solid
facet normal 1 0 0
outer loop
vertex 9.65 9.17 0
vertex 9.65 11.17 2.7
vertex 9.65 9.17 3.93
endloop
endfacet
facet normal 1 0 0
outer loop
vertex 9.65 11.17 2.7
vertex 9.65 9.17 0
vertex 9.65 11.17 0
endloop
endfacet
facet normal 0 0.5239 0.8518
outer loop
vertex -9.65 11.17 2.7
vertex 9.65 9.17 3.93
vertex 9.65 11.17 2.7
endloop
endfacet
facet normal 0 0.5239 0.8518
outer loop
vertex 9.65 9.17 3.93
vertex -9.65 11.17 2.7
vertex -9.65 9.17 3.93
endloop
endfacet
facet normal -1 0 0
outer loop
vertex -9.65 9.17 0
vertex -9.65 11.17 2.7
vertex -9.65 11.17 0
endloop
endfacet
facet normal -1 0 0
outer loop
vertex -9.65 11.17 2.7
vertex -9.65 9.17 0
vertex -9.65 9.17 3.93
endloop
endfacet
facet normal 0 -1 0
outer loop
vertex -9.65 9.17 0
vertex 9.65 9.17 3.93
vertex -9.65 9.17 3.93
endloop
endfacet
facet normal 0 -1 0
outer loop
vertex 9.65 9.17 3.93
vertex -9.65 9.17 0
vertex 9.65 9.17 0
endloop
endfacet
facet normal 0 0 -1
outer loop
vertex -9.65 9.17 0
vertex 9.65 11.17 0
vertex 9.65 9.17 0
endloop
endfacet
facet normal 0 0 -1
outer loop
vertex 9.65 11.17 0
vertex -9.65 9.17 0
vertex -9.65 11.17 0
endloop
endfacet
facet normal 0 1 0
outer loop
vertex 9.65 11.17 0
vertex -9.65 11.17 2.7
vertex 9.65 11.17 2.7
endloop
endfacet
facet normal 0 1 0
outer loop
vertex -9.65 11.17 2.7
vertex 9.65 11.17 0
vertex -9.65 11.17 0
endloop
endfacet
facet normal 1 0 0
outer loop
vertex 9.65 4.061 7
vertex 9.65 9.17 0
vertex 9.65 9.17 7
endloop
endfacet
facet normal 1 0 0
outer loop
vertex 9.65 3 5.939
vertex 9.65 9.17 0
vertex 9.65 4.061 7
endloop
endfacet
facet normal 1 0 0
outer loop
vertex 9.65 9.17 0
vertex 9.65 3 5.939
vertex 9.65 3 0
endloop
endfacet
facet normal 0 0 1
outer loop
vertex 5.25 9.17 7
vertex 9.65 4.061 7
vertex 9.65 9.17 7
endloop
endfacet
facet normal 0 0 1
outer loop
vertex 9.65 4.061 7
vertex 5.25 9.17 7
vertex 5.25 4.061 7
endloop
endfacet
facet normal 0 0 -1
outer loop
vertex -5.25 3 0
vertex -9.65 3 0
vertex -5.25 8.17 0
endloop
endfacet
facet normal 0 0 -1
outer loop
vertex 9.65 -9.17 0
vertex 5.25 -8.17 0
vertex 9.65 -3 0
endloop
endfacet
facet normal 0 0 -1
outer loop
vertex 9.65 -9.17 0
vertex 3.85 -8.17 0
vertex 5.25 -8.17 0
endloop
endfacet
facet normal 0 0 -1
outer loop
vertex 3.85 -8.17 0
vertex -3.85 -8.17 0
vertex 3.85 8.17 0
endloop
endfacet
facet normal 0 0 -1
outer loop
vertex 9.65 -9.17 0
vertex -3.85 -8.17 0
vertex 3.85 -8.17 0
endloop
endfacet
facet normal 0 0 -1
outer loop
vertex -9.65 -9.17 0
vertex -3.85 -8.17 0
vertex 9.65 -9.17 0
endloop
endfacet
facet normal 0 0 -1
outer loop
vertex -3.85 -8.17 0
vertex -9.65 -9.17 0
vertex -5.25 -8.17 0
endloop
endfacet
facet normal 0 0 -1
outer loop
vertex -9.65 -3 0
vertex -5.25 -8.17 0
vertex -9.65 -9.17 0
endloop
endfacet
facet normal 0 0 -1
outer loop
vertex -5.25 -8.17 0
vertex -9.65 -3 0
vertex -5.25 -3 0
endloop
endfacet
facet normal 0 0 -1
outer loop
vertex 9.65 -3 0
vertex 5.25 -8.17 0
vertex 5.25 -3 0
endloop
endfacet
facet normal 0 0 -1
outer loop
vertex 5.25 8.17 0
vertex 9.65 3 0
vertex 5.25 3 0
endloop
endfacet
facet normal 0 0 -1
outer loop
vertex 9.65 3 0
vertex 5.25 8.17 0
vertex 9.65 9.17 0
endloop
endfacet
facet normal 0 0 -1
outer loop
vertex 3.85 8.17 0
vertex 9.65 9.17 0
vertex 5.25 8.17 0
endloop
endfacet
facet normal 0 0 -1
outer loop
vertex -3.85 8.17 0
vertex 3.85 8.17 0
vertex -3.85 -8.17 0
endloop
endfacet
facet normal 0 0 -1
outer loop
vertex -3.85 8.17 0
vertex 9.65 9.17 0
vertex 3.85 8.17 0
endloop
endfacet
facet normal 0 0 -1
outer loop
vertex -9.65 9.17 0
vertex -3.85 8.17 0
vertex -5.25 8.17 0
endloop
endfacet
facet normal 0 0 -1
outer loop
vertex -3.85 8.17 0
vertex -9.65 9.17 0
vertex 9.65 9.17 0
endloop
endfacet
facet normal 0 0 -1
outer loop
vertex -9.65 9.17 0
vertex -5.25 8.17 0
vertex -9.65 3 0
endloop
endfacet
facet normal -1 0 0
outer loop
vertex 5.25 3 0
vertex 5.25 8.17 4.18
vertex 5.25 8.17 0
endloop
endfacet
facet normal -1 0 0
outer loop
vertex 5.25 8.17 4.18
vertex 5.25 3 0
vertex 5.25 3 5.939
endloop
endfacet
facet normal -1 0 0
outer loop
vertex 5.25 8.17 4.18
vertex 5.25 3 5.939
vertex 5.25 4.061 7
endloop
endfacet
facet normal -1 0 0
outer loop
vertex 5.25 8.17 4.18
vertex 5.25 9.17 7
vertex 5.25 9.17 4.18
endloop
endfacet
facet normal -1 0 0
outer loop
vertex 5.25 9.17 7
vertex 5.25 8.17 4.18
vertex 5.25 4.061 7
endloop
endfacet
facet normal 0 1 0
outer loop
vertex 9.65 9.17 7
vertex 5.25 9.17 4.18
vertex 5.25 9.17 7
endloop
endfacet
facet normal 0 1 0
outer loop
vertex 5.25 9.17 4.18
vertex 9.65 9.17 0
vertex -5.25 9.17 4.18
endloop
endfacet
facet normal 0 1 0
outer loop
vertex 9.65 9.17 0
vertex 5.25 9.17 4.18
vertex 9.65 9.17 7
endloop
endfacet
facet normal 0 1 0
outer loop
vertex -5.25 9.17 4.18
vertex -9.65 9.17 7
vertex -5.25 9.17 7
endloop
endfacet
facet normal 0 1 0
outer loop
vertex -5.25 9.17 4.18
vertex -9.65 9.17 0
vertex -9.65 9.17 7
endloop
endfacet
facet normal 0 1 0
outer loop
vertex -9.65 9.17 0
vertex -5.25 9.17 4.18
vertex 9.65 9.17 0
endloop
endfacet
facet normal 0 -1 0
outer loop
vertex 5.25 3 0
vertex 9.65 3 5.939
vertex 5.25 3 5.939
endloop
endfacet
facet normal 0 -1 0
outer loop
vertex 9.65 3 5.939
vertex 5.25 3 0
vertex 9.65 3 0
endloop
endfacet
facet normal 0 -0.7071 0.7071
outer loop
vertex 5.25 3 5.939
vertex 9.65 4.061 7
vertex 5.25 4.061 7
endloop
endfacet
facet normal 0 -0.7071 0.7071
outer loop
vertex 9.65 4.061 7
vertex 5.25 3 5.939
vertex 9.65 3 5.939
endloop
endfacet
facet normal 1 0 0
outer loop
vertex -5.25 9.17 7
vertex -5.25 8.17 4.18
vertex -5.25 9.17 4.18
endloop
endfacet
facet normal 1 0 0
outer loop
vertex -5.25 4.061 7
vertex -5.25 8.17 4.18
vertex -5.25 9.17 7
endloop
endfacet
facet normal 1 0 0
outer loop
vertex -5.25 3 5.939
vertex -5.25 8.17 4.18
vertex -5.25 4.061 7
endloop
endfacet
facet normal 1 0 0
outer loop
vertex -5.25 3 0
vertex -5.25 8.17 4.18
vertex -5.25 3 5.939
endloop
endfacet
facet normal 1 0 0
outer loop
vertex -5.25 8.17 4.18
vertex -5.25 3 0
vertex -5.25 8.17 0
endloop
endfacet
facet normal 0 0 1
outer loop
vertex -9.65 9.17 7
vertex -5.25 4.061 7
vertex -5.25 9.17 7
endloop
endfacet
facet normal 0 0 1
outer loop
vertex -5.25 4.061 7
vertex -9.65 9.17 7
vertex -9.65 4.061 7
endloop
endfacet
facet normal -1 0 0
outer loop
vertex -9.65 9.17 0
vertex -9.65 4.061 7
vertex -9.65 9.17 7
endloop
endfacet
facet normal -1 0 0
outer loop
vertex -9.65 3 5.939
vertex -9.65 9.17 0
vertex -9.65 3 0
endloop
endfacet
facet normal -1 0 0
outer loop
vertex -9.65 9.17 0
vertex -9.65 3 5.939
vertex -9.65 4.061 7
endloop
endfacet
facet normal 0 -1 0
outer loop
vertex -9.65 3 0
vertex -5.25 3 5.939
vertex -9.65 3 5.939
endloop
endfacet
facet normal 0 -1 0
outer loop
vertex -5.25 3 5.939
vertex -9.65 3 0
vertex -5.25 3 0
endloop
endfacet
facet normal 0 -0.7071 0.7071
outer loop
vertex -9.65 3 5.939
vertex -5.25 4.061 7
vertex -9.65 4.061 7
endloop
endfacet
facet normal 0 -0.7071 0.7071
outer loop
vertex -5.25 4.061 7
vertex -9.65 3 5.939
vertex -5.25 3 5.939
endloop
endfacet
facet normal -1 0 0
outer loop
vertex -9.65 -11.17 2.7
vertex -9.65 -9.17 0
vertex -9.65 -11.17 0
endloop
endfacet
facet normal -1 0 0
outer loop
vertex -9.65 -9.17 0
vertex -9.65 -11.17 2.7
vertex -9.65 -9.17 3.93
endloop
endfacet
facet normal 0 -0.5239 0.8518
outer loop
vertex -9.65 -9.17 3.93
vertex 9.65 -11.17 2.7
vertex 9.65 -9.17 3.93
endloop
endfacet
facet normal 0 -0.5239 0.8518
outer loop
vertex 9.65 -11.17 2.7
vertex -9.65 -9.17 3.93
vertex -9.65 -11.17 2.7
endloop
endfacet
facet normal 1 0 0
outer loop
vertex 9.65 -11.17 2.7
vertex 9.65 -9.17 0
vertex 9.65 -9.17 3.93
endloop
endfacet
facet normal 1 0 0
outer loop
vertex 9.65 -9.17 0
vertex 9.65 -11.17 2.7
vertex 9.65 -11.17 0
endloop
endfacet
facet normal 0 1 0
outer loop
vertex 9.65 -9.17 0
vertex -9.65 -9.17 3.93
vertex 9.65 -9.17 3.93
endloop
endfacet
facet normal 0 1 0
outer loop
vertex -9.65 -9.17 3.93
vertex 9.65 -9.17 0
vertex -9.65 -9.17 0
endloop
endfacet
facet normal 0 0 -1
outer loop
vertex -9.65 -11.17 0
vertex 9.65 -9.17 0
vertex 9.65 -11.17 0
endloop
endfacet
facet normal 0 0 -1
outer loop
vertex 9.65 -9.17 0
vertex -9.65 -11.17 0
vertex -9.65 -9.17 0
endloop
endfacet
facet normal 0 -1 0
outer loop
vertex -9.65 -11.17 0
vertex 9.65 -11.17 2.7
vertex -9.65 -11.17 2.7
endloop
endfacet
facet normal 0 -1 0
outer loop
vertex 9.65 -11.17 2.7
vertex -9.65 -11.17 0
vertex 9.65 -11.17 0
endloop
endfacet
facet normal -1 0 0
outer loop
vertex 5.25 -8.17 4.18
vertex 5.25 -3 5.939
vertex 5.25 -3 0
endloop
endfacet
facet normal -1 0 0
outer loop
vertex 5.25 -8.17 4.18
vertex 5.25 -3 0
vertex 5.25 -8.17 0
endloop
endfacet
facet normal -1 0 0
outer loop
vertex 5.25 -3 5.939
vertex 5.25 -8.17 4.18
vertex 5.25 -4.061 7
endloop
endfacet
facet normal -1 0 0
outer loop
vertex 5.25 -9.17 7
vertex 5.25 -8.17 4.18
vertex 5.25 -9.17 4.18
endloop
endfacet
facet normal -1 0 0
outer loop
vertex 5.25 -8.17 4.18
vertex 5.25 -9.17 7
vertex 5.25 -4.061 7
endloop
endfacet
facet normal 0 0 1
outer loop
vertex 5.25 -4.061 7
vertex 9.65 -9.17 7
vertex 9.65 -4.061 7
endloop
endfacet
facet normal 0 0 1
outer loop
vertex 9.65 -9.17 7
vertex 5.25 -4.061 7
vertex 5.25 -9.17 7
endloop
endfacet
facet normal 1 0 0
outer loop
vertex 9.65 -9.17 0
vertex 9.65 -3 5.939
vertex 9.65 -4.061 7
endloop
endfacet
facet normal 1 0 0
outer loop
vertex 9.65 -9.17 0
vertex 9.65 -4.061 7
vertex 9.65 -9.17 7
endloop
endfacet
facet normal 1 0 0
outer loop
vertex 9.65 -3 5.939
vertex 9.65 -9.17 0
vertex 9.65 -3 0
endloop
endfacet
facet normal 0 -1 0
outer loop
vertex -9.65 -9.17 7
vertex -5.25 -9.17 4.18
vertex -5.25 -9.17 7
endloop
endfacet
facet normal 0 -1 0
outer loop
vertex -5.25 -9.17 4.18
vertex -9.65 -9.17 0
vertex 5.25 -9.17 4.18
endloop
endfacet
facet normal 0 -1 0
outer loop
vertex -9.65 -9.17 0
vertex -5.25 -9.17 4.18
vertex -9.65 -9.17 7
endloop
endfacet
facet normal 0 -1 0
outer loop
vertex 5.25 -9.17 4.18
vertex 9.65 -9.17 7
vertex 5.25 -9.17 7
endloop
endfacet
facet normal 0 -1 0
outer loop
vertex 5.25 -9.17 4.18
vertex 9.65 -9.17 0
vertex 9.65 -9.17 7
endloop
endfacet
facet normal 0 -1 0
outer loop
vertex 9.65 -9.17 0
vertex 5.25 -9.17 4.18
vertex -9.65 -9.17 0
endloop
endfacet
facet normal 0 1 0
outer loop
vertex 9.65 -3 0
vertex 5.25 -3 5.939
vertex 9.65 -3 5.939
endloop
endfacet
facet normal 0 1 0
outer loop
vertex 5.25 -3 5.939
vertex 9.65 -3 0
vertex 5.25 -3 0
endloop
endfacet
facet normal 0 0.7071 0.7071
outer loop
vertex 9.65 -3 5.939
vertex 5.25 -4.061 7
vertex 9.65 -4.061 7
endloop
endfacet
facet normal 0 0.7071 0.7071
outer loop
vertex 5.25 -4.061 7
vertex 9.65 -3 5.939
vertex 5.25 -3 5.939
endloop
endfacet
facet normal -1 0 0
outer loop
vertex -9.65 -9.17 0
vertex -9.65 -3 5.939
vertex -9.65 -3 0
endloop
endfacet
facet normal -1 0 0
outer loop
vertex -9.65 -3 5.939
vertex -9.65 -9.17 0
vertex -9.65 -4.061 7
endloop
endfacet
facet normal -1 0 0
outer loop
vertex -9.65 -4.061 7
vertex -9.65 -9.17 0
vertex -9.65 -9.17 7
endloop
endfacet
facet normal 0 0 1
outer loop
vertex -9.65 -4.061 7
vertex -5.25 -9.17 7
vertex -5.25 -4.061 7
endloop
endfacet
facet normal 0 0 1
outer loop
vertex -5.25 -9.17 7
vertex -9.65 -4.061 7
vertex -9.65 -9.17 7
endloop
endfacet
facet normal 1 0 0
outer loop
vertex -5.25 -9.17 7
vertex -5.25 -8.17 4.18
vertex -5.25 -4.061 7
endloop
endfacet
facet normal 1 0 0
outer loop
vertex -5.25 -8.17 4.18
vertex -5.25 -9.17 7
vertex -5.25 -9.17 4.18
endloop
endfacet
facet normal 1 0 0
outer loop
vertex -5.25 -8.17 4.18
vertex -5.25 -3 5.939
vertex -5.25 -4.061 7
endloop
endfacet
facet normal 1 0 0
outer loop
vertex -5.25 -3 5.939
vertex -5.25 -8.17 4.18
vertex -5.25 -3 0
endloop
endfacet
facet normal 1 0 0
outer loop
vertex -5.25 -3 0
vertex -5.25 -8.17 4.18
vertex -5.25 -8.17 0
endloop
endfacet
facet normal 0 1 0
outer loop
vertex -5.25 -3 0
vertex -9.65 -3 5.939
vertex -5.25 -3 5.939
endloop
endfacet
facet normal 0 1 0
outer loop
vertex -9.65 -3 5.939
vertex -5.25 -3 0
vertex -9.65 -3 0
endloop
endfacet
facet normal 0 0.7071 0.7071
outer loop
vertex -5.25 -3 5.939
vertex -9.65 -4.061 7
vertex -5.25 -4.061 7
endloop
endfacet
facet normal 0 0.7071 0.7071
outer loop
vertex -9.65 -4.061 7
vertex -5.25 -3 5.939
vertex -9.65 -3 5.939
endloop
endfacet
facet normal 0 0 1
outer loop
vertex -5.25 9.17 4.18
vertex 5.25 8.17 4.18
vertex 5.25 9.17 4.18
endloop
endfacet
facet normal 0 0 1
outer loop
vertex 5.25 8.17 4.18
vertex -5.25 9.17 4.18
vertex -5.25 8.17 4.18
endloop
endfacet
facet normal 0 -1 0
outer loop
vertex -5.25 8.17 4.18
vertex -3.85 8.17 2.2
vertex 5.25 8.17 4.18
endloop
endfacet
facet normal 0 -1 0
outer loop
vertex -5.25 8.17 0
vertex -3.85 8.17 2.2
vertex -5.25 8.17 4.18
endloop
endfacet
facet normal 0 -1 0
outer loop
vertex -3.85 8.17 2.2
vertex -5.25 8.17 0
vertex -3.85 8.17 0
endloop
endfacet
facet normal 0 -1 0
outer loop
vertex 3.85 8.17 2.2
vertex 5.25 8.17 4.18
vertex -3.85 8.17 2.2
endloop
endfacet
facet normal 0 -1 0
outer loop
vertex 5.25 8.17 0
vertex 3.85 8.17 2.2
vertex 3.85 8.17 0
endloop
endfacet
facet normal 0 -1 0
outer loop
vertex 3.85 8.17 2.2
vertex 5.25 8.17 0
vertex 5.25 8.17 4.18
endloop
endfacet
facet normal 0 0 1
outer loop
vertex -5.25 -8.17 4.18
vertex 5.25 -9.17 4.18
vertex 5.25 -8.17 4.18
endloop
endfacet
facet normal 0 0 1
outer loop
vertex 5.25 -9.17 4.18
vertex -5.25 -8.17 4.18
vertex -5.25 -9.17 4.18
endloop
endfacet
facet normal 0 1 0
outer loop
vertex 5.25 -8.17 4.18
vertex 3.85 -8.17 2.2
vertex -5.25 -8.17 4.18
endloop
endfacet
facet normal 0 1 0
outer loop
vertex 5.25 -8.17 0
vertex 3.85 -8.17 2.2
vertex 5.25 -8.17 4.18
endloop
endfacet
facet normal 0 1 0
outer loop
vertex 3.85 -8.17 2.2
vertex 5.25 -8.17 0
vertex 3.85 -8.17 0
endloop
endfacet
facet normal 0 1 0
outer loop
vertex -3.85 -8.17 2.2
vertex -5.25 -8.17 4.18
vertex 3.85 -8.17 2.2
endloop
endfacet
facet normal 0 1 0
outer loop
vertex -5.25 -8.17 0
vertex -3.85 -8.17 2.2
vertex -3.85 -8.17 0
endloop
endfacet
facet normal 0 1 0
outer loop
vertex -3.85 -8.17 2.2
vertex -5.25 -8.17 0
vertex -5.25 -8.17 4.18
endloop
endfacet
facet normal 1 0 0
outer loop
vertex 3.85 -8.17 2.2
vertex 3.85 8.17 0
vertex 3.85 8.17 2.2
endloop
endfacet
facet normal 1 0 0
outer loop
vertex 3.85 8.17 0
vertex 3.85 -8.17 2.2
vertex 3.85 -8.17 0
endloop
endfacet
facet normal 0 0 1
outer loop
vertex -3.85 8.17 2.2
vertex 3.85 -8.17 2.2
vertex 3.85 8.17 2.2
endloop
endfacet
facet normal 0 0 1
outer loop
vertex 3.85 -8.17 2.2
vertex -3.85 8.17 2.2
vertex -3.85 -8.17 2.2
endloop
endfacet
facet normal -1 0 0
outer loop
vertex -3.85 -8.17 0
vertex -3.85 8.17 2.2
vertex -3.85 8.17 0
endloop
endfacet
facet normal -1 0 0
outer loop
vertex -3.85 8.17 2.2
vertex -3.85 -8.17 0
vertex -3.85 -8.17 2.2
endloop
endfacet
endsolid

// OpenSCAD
// Crenels are the cubes near each corner. Use this to modify their width, depth, and height.
crenel_wdh = [4.4, 6.17, 7];

// Distance between crenels across the Y-axis (left to right)
y_distance_between_crenels = 10.5;

// Distance between crenels across the X-axis (face to face)
x_distance_between_crenels = 6;

// Size of the gap between the crenel and the bridge that connects the opposite pairs of crenels
crenel_to_bridge_gap = 1.4;

bridge_thickness = 2.2;

// height of the wall on top of the bridge between the crenels
wall_height = 1.98;

back_shelf_depth = 2;
back_shelf_height = 2.7;


module __Customizer_Limit__ () {}  // Hide following assignments from Customizer.

gap_x = y_distance_between_crenels;
sliver_x = crenel_to_bridge_gap;
gap_y = x_distance_between_crenels;

bridge_wdh = [
  gap_x - (2*sliver_x),
  (2*crenel_wdh.y)+gap_y,
  bridge_thickness
];

assembly();

module assembly() {
  // bridge
  translate([0, 0, bridge_wdh.z/2])
    cube(bridge_wdh, center=true);

  ridge_wdh = [gap_x + (2*crenel_wdh.x), 1, bridge_wdh.z + wall_height];
  for (y = [1, -1]) {
    // ridges mesh into bridge and crenels butt up against ridges
    ridge_trans_y = y*(bridge_wdh.y/2 - ridge_wdh.y/2);
    translate([0, ridge_trans_y, ridge_wdh.z/2])
      cube(ridge_wdh, center=true);

    // shelf in the back
    shelf_wdh = [ridge_wdh.x, back_shelf_depth, back_shelf_height];
    tri_chamf_h = ridge_wdh.z - shelf_wdh.z - 0.25;
    translate([
      0,
      y*((shelf_wdh.y/2) + (bridge_wdh.y/2)),
      shelf_wdh.z/2
    ])
      rotate([0, 0, y > 0 ? 0 : 180])
      union() {
        translate([(shelf_wdh.x/2), shelf_wdh.y/-2, shelf_wdh.z/2])
        rotate([0, -90, 0])
          linear_extrude(height = shelf_wdh.x)
          polygon([
            [0,0], [0,shelf_wdh.y], [tri_chamf_h, 0]
          ]);

        cube(shelf_wdh, center=true);
      }

    // crenels
    for (x = [1, -1]) {
      translate([
        x*(ridge_wdh.x/2 - crenel_wdh.x/2),
        (ridge_trans_y+ridge_wdh.y/(y*2))+(crenel_wdh.y*-y),
        0
      ])
        crenel(y);
    }

  }

}

// side can be 1 or -1
module crenel(side=1) {
  rotate([0, 0, side < 1 ? 180 : 0])
  difference() {
    translate([crenel_wdh.x/-2, 0, 0])
      cube(crenel_wdh);

    // chamfer
    chamf = [crenel_wdh.x + 2, 1.5, 1.5];
    translate([0, 0, crenel_wdh.z])
      rotate([45, 0, 0])
      cube(chamf, center=true);
  }

}
